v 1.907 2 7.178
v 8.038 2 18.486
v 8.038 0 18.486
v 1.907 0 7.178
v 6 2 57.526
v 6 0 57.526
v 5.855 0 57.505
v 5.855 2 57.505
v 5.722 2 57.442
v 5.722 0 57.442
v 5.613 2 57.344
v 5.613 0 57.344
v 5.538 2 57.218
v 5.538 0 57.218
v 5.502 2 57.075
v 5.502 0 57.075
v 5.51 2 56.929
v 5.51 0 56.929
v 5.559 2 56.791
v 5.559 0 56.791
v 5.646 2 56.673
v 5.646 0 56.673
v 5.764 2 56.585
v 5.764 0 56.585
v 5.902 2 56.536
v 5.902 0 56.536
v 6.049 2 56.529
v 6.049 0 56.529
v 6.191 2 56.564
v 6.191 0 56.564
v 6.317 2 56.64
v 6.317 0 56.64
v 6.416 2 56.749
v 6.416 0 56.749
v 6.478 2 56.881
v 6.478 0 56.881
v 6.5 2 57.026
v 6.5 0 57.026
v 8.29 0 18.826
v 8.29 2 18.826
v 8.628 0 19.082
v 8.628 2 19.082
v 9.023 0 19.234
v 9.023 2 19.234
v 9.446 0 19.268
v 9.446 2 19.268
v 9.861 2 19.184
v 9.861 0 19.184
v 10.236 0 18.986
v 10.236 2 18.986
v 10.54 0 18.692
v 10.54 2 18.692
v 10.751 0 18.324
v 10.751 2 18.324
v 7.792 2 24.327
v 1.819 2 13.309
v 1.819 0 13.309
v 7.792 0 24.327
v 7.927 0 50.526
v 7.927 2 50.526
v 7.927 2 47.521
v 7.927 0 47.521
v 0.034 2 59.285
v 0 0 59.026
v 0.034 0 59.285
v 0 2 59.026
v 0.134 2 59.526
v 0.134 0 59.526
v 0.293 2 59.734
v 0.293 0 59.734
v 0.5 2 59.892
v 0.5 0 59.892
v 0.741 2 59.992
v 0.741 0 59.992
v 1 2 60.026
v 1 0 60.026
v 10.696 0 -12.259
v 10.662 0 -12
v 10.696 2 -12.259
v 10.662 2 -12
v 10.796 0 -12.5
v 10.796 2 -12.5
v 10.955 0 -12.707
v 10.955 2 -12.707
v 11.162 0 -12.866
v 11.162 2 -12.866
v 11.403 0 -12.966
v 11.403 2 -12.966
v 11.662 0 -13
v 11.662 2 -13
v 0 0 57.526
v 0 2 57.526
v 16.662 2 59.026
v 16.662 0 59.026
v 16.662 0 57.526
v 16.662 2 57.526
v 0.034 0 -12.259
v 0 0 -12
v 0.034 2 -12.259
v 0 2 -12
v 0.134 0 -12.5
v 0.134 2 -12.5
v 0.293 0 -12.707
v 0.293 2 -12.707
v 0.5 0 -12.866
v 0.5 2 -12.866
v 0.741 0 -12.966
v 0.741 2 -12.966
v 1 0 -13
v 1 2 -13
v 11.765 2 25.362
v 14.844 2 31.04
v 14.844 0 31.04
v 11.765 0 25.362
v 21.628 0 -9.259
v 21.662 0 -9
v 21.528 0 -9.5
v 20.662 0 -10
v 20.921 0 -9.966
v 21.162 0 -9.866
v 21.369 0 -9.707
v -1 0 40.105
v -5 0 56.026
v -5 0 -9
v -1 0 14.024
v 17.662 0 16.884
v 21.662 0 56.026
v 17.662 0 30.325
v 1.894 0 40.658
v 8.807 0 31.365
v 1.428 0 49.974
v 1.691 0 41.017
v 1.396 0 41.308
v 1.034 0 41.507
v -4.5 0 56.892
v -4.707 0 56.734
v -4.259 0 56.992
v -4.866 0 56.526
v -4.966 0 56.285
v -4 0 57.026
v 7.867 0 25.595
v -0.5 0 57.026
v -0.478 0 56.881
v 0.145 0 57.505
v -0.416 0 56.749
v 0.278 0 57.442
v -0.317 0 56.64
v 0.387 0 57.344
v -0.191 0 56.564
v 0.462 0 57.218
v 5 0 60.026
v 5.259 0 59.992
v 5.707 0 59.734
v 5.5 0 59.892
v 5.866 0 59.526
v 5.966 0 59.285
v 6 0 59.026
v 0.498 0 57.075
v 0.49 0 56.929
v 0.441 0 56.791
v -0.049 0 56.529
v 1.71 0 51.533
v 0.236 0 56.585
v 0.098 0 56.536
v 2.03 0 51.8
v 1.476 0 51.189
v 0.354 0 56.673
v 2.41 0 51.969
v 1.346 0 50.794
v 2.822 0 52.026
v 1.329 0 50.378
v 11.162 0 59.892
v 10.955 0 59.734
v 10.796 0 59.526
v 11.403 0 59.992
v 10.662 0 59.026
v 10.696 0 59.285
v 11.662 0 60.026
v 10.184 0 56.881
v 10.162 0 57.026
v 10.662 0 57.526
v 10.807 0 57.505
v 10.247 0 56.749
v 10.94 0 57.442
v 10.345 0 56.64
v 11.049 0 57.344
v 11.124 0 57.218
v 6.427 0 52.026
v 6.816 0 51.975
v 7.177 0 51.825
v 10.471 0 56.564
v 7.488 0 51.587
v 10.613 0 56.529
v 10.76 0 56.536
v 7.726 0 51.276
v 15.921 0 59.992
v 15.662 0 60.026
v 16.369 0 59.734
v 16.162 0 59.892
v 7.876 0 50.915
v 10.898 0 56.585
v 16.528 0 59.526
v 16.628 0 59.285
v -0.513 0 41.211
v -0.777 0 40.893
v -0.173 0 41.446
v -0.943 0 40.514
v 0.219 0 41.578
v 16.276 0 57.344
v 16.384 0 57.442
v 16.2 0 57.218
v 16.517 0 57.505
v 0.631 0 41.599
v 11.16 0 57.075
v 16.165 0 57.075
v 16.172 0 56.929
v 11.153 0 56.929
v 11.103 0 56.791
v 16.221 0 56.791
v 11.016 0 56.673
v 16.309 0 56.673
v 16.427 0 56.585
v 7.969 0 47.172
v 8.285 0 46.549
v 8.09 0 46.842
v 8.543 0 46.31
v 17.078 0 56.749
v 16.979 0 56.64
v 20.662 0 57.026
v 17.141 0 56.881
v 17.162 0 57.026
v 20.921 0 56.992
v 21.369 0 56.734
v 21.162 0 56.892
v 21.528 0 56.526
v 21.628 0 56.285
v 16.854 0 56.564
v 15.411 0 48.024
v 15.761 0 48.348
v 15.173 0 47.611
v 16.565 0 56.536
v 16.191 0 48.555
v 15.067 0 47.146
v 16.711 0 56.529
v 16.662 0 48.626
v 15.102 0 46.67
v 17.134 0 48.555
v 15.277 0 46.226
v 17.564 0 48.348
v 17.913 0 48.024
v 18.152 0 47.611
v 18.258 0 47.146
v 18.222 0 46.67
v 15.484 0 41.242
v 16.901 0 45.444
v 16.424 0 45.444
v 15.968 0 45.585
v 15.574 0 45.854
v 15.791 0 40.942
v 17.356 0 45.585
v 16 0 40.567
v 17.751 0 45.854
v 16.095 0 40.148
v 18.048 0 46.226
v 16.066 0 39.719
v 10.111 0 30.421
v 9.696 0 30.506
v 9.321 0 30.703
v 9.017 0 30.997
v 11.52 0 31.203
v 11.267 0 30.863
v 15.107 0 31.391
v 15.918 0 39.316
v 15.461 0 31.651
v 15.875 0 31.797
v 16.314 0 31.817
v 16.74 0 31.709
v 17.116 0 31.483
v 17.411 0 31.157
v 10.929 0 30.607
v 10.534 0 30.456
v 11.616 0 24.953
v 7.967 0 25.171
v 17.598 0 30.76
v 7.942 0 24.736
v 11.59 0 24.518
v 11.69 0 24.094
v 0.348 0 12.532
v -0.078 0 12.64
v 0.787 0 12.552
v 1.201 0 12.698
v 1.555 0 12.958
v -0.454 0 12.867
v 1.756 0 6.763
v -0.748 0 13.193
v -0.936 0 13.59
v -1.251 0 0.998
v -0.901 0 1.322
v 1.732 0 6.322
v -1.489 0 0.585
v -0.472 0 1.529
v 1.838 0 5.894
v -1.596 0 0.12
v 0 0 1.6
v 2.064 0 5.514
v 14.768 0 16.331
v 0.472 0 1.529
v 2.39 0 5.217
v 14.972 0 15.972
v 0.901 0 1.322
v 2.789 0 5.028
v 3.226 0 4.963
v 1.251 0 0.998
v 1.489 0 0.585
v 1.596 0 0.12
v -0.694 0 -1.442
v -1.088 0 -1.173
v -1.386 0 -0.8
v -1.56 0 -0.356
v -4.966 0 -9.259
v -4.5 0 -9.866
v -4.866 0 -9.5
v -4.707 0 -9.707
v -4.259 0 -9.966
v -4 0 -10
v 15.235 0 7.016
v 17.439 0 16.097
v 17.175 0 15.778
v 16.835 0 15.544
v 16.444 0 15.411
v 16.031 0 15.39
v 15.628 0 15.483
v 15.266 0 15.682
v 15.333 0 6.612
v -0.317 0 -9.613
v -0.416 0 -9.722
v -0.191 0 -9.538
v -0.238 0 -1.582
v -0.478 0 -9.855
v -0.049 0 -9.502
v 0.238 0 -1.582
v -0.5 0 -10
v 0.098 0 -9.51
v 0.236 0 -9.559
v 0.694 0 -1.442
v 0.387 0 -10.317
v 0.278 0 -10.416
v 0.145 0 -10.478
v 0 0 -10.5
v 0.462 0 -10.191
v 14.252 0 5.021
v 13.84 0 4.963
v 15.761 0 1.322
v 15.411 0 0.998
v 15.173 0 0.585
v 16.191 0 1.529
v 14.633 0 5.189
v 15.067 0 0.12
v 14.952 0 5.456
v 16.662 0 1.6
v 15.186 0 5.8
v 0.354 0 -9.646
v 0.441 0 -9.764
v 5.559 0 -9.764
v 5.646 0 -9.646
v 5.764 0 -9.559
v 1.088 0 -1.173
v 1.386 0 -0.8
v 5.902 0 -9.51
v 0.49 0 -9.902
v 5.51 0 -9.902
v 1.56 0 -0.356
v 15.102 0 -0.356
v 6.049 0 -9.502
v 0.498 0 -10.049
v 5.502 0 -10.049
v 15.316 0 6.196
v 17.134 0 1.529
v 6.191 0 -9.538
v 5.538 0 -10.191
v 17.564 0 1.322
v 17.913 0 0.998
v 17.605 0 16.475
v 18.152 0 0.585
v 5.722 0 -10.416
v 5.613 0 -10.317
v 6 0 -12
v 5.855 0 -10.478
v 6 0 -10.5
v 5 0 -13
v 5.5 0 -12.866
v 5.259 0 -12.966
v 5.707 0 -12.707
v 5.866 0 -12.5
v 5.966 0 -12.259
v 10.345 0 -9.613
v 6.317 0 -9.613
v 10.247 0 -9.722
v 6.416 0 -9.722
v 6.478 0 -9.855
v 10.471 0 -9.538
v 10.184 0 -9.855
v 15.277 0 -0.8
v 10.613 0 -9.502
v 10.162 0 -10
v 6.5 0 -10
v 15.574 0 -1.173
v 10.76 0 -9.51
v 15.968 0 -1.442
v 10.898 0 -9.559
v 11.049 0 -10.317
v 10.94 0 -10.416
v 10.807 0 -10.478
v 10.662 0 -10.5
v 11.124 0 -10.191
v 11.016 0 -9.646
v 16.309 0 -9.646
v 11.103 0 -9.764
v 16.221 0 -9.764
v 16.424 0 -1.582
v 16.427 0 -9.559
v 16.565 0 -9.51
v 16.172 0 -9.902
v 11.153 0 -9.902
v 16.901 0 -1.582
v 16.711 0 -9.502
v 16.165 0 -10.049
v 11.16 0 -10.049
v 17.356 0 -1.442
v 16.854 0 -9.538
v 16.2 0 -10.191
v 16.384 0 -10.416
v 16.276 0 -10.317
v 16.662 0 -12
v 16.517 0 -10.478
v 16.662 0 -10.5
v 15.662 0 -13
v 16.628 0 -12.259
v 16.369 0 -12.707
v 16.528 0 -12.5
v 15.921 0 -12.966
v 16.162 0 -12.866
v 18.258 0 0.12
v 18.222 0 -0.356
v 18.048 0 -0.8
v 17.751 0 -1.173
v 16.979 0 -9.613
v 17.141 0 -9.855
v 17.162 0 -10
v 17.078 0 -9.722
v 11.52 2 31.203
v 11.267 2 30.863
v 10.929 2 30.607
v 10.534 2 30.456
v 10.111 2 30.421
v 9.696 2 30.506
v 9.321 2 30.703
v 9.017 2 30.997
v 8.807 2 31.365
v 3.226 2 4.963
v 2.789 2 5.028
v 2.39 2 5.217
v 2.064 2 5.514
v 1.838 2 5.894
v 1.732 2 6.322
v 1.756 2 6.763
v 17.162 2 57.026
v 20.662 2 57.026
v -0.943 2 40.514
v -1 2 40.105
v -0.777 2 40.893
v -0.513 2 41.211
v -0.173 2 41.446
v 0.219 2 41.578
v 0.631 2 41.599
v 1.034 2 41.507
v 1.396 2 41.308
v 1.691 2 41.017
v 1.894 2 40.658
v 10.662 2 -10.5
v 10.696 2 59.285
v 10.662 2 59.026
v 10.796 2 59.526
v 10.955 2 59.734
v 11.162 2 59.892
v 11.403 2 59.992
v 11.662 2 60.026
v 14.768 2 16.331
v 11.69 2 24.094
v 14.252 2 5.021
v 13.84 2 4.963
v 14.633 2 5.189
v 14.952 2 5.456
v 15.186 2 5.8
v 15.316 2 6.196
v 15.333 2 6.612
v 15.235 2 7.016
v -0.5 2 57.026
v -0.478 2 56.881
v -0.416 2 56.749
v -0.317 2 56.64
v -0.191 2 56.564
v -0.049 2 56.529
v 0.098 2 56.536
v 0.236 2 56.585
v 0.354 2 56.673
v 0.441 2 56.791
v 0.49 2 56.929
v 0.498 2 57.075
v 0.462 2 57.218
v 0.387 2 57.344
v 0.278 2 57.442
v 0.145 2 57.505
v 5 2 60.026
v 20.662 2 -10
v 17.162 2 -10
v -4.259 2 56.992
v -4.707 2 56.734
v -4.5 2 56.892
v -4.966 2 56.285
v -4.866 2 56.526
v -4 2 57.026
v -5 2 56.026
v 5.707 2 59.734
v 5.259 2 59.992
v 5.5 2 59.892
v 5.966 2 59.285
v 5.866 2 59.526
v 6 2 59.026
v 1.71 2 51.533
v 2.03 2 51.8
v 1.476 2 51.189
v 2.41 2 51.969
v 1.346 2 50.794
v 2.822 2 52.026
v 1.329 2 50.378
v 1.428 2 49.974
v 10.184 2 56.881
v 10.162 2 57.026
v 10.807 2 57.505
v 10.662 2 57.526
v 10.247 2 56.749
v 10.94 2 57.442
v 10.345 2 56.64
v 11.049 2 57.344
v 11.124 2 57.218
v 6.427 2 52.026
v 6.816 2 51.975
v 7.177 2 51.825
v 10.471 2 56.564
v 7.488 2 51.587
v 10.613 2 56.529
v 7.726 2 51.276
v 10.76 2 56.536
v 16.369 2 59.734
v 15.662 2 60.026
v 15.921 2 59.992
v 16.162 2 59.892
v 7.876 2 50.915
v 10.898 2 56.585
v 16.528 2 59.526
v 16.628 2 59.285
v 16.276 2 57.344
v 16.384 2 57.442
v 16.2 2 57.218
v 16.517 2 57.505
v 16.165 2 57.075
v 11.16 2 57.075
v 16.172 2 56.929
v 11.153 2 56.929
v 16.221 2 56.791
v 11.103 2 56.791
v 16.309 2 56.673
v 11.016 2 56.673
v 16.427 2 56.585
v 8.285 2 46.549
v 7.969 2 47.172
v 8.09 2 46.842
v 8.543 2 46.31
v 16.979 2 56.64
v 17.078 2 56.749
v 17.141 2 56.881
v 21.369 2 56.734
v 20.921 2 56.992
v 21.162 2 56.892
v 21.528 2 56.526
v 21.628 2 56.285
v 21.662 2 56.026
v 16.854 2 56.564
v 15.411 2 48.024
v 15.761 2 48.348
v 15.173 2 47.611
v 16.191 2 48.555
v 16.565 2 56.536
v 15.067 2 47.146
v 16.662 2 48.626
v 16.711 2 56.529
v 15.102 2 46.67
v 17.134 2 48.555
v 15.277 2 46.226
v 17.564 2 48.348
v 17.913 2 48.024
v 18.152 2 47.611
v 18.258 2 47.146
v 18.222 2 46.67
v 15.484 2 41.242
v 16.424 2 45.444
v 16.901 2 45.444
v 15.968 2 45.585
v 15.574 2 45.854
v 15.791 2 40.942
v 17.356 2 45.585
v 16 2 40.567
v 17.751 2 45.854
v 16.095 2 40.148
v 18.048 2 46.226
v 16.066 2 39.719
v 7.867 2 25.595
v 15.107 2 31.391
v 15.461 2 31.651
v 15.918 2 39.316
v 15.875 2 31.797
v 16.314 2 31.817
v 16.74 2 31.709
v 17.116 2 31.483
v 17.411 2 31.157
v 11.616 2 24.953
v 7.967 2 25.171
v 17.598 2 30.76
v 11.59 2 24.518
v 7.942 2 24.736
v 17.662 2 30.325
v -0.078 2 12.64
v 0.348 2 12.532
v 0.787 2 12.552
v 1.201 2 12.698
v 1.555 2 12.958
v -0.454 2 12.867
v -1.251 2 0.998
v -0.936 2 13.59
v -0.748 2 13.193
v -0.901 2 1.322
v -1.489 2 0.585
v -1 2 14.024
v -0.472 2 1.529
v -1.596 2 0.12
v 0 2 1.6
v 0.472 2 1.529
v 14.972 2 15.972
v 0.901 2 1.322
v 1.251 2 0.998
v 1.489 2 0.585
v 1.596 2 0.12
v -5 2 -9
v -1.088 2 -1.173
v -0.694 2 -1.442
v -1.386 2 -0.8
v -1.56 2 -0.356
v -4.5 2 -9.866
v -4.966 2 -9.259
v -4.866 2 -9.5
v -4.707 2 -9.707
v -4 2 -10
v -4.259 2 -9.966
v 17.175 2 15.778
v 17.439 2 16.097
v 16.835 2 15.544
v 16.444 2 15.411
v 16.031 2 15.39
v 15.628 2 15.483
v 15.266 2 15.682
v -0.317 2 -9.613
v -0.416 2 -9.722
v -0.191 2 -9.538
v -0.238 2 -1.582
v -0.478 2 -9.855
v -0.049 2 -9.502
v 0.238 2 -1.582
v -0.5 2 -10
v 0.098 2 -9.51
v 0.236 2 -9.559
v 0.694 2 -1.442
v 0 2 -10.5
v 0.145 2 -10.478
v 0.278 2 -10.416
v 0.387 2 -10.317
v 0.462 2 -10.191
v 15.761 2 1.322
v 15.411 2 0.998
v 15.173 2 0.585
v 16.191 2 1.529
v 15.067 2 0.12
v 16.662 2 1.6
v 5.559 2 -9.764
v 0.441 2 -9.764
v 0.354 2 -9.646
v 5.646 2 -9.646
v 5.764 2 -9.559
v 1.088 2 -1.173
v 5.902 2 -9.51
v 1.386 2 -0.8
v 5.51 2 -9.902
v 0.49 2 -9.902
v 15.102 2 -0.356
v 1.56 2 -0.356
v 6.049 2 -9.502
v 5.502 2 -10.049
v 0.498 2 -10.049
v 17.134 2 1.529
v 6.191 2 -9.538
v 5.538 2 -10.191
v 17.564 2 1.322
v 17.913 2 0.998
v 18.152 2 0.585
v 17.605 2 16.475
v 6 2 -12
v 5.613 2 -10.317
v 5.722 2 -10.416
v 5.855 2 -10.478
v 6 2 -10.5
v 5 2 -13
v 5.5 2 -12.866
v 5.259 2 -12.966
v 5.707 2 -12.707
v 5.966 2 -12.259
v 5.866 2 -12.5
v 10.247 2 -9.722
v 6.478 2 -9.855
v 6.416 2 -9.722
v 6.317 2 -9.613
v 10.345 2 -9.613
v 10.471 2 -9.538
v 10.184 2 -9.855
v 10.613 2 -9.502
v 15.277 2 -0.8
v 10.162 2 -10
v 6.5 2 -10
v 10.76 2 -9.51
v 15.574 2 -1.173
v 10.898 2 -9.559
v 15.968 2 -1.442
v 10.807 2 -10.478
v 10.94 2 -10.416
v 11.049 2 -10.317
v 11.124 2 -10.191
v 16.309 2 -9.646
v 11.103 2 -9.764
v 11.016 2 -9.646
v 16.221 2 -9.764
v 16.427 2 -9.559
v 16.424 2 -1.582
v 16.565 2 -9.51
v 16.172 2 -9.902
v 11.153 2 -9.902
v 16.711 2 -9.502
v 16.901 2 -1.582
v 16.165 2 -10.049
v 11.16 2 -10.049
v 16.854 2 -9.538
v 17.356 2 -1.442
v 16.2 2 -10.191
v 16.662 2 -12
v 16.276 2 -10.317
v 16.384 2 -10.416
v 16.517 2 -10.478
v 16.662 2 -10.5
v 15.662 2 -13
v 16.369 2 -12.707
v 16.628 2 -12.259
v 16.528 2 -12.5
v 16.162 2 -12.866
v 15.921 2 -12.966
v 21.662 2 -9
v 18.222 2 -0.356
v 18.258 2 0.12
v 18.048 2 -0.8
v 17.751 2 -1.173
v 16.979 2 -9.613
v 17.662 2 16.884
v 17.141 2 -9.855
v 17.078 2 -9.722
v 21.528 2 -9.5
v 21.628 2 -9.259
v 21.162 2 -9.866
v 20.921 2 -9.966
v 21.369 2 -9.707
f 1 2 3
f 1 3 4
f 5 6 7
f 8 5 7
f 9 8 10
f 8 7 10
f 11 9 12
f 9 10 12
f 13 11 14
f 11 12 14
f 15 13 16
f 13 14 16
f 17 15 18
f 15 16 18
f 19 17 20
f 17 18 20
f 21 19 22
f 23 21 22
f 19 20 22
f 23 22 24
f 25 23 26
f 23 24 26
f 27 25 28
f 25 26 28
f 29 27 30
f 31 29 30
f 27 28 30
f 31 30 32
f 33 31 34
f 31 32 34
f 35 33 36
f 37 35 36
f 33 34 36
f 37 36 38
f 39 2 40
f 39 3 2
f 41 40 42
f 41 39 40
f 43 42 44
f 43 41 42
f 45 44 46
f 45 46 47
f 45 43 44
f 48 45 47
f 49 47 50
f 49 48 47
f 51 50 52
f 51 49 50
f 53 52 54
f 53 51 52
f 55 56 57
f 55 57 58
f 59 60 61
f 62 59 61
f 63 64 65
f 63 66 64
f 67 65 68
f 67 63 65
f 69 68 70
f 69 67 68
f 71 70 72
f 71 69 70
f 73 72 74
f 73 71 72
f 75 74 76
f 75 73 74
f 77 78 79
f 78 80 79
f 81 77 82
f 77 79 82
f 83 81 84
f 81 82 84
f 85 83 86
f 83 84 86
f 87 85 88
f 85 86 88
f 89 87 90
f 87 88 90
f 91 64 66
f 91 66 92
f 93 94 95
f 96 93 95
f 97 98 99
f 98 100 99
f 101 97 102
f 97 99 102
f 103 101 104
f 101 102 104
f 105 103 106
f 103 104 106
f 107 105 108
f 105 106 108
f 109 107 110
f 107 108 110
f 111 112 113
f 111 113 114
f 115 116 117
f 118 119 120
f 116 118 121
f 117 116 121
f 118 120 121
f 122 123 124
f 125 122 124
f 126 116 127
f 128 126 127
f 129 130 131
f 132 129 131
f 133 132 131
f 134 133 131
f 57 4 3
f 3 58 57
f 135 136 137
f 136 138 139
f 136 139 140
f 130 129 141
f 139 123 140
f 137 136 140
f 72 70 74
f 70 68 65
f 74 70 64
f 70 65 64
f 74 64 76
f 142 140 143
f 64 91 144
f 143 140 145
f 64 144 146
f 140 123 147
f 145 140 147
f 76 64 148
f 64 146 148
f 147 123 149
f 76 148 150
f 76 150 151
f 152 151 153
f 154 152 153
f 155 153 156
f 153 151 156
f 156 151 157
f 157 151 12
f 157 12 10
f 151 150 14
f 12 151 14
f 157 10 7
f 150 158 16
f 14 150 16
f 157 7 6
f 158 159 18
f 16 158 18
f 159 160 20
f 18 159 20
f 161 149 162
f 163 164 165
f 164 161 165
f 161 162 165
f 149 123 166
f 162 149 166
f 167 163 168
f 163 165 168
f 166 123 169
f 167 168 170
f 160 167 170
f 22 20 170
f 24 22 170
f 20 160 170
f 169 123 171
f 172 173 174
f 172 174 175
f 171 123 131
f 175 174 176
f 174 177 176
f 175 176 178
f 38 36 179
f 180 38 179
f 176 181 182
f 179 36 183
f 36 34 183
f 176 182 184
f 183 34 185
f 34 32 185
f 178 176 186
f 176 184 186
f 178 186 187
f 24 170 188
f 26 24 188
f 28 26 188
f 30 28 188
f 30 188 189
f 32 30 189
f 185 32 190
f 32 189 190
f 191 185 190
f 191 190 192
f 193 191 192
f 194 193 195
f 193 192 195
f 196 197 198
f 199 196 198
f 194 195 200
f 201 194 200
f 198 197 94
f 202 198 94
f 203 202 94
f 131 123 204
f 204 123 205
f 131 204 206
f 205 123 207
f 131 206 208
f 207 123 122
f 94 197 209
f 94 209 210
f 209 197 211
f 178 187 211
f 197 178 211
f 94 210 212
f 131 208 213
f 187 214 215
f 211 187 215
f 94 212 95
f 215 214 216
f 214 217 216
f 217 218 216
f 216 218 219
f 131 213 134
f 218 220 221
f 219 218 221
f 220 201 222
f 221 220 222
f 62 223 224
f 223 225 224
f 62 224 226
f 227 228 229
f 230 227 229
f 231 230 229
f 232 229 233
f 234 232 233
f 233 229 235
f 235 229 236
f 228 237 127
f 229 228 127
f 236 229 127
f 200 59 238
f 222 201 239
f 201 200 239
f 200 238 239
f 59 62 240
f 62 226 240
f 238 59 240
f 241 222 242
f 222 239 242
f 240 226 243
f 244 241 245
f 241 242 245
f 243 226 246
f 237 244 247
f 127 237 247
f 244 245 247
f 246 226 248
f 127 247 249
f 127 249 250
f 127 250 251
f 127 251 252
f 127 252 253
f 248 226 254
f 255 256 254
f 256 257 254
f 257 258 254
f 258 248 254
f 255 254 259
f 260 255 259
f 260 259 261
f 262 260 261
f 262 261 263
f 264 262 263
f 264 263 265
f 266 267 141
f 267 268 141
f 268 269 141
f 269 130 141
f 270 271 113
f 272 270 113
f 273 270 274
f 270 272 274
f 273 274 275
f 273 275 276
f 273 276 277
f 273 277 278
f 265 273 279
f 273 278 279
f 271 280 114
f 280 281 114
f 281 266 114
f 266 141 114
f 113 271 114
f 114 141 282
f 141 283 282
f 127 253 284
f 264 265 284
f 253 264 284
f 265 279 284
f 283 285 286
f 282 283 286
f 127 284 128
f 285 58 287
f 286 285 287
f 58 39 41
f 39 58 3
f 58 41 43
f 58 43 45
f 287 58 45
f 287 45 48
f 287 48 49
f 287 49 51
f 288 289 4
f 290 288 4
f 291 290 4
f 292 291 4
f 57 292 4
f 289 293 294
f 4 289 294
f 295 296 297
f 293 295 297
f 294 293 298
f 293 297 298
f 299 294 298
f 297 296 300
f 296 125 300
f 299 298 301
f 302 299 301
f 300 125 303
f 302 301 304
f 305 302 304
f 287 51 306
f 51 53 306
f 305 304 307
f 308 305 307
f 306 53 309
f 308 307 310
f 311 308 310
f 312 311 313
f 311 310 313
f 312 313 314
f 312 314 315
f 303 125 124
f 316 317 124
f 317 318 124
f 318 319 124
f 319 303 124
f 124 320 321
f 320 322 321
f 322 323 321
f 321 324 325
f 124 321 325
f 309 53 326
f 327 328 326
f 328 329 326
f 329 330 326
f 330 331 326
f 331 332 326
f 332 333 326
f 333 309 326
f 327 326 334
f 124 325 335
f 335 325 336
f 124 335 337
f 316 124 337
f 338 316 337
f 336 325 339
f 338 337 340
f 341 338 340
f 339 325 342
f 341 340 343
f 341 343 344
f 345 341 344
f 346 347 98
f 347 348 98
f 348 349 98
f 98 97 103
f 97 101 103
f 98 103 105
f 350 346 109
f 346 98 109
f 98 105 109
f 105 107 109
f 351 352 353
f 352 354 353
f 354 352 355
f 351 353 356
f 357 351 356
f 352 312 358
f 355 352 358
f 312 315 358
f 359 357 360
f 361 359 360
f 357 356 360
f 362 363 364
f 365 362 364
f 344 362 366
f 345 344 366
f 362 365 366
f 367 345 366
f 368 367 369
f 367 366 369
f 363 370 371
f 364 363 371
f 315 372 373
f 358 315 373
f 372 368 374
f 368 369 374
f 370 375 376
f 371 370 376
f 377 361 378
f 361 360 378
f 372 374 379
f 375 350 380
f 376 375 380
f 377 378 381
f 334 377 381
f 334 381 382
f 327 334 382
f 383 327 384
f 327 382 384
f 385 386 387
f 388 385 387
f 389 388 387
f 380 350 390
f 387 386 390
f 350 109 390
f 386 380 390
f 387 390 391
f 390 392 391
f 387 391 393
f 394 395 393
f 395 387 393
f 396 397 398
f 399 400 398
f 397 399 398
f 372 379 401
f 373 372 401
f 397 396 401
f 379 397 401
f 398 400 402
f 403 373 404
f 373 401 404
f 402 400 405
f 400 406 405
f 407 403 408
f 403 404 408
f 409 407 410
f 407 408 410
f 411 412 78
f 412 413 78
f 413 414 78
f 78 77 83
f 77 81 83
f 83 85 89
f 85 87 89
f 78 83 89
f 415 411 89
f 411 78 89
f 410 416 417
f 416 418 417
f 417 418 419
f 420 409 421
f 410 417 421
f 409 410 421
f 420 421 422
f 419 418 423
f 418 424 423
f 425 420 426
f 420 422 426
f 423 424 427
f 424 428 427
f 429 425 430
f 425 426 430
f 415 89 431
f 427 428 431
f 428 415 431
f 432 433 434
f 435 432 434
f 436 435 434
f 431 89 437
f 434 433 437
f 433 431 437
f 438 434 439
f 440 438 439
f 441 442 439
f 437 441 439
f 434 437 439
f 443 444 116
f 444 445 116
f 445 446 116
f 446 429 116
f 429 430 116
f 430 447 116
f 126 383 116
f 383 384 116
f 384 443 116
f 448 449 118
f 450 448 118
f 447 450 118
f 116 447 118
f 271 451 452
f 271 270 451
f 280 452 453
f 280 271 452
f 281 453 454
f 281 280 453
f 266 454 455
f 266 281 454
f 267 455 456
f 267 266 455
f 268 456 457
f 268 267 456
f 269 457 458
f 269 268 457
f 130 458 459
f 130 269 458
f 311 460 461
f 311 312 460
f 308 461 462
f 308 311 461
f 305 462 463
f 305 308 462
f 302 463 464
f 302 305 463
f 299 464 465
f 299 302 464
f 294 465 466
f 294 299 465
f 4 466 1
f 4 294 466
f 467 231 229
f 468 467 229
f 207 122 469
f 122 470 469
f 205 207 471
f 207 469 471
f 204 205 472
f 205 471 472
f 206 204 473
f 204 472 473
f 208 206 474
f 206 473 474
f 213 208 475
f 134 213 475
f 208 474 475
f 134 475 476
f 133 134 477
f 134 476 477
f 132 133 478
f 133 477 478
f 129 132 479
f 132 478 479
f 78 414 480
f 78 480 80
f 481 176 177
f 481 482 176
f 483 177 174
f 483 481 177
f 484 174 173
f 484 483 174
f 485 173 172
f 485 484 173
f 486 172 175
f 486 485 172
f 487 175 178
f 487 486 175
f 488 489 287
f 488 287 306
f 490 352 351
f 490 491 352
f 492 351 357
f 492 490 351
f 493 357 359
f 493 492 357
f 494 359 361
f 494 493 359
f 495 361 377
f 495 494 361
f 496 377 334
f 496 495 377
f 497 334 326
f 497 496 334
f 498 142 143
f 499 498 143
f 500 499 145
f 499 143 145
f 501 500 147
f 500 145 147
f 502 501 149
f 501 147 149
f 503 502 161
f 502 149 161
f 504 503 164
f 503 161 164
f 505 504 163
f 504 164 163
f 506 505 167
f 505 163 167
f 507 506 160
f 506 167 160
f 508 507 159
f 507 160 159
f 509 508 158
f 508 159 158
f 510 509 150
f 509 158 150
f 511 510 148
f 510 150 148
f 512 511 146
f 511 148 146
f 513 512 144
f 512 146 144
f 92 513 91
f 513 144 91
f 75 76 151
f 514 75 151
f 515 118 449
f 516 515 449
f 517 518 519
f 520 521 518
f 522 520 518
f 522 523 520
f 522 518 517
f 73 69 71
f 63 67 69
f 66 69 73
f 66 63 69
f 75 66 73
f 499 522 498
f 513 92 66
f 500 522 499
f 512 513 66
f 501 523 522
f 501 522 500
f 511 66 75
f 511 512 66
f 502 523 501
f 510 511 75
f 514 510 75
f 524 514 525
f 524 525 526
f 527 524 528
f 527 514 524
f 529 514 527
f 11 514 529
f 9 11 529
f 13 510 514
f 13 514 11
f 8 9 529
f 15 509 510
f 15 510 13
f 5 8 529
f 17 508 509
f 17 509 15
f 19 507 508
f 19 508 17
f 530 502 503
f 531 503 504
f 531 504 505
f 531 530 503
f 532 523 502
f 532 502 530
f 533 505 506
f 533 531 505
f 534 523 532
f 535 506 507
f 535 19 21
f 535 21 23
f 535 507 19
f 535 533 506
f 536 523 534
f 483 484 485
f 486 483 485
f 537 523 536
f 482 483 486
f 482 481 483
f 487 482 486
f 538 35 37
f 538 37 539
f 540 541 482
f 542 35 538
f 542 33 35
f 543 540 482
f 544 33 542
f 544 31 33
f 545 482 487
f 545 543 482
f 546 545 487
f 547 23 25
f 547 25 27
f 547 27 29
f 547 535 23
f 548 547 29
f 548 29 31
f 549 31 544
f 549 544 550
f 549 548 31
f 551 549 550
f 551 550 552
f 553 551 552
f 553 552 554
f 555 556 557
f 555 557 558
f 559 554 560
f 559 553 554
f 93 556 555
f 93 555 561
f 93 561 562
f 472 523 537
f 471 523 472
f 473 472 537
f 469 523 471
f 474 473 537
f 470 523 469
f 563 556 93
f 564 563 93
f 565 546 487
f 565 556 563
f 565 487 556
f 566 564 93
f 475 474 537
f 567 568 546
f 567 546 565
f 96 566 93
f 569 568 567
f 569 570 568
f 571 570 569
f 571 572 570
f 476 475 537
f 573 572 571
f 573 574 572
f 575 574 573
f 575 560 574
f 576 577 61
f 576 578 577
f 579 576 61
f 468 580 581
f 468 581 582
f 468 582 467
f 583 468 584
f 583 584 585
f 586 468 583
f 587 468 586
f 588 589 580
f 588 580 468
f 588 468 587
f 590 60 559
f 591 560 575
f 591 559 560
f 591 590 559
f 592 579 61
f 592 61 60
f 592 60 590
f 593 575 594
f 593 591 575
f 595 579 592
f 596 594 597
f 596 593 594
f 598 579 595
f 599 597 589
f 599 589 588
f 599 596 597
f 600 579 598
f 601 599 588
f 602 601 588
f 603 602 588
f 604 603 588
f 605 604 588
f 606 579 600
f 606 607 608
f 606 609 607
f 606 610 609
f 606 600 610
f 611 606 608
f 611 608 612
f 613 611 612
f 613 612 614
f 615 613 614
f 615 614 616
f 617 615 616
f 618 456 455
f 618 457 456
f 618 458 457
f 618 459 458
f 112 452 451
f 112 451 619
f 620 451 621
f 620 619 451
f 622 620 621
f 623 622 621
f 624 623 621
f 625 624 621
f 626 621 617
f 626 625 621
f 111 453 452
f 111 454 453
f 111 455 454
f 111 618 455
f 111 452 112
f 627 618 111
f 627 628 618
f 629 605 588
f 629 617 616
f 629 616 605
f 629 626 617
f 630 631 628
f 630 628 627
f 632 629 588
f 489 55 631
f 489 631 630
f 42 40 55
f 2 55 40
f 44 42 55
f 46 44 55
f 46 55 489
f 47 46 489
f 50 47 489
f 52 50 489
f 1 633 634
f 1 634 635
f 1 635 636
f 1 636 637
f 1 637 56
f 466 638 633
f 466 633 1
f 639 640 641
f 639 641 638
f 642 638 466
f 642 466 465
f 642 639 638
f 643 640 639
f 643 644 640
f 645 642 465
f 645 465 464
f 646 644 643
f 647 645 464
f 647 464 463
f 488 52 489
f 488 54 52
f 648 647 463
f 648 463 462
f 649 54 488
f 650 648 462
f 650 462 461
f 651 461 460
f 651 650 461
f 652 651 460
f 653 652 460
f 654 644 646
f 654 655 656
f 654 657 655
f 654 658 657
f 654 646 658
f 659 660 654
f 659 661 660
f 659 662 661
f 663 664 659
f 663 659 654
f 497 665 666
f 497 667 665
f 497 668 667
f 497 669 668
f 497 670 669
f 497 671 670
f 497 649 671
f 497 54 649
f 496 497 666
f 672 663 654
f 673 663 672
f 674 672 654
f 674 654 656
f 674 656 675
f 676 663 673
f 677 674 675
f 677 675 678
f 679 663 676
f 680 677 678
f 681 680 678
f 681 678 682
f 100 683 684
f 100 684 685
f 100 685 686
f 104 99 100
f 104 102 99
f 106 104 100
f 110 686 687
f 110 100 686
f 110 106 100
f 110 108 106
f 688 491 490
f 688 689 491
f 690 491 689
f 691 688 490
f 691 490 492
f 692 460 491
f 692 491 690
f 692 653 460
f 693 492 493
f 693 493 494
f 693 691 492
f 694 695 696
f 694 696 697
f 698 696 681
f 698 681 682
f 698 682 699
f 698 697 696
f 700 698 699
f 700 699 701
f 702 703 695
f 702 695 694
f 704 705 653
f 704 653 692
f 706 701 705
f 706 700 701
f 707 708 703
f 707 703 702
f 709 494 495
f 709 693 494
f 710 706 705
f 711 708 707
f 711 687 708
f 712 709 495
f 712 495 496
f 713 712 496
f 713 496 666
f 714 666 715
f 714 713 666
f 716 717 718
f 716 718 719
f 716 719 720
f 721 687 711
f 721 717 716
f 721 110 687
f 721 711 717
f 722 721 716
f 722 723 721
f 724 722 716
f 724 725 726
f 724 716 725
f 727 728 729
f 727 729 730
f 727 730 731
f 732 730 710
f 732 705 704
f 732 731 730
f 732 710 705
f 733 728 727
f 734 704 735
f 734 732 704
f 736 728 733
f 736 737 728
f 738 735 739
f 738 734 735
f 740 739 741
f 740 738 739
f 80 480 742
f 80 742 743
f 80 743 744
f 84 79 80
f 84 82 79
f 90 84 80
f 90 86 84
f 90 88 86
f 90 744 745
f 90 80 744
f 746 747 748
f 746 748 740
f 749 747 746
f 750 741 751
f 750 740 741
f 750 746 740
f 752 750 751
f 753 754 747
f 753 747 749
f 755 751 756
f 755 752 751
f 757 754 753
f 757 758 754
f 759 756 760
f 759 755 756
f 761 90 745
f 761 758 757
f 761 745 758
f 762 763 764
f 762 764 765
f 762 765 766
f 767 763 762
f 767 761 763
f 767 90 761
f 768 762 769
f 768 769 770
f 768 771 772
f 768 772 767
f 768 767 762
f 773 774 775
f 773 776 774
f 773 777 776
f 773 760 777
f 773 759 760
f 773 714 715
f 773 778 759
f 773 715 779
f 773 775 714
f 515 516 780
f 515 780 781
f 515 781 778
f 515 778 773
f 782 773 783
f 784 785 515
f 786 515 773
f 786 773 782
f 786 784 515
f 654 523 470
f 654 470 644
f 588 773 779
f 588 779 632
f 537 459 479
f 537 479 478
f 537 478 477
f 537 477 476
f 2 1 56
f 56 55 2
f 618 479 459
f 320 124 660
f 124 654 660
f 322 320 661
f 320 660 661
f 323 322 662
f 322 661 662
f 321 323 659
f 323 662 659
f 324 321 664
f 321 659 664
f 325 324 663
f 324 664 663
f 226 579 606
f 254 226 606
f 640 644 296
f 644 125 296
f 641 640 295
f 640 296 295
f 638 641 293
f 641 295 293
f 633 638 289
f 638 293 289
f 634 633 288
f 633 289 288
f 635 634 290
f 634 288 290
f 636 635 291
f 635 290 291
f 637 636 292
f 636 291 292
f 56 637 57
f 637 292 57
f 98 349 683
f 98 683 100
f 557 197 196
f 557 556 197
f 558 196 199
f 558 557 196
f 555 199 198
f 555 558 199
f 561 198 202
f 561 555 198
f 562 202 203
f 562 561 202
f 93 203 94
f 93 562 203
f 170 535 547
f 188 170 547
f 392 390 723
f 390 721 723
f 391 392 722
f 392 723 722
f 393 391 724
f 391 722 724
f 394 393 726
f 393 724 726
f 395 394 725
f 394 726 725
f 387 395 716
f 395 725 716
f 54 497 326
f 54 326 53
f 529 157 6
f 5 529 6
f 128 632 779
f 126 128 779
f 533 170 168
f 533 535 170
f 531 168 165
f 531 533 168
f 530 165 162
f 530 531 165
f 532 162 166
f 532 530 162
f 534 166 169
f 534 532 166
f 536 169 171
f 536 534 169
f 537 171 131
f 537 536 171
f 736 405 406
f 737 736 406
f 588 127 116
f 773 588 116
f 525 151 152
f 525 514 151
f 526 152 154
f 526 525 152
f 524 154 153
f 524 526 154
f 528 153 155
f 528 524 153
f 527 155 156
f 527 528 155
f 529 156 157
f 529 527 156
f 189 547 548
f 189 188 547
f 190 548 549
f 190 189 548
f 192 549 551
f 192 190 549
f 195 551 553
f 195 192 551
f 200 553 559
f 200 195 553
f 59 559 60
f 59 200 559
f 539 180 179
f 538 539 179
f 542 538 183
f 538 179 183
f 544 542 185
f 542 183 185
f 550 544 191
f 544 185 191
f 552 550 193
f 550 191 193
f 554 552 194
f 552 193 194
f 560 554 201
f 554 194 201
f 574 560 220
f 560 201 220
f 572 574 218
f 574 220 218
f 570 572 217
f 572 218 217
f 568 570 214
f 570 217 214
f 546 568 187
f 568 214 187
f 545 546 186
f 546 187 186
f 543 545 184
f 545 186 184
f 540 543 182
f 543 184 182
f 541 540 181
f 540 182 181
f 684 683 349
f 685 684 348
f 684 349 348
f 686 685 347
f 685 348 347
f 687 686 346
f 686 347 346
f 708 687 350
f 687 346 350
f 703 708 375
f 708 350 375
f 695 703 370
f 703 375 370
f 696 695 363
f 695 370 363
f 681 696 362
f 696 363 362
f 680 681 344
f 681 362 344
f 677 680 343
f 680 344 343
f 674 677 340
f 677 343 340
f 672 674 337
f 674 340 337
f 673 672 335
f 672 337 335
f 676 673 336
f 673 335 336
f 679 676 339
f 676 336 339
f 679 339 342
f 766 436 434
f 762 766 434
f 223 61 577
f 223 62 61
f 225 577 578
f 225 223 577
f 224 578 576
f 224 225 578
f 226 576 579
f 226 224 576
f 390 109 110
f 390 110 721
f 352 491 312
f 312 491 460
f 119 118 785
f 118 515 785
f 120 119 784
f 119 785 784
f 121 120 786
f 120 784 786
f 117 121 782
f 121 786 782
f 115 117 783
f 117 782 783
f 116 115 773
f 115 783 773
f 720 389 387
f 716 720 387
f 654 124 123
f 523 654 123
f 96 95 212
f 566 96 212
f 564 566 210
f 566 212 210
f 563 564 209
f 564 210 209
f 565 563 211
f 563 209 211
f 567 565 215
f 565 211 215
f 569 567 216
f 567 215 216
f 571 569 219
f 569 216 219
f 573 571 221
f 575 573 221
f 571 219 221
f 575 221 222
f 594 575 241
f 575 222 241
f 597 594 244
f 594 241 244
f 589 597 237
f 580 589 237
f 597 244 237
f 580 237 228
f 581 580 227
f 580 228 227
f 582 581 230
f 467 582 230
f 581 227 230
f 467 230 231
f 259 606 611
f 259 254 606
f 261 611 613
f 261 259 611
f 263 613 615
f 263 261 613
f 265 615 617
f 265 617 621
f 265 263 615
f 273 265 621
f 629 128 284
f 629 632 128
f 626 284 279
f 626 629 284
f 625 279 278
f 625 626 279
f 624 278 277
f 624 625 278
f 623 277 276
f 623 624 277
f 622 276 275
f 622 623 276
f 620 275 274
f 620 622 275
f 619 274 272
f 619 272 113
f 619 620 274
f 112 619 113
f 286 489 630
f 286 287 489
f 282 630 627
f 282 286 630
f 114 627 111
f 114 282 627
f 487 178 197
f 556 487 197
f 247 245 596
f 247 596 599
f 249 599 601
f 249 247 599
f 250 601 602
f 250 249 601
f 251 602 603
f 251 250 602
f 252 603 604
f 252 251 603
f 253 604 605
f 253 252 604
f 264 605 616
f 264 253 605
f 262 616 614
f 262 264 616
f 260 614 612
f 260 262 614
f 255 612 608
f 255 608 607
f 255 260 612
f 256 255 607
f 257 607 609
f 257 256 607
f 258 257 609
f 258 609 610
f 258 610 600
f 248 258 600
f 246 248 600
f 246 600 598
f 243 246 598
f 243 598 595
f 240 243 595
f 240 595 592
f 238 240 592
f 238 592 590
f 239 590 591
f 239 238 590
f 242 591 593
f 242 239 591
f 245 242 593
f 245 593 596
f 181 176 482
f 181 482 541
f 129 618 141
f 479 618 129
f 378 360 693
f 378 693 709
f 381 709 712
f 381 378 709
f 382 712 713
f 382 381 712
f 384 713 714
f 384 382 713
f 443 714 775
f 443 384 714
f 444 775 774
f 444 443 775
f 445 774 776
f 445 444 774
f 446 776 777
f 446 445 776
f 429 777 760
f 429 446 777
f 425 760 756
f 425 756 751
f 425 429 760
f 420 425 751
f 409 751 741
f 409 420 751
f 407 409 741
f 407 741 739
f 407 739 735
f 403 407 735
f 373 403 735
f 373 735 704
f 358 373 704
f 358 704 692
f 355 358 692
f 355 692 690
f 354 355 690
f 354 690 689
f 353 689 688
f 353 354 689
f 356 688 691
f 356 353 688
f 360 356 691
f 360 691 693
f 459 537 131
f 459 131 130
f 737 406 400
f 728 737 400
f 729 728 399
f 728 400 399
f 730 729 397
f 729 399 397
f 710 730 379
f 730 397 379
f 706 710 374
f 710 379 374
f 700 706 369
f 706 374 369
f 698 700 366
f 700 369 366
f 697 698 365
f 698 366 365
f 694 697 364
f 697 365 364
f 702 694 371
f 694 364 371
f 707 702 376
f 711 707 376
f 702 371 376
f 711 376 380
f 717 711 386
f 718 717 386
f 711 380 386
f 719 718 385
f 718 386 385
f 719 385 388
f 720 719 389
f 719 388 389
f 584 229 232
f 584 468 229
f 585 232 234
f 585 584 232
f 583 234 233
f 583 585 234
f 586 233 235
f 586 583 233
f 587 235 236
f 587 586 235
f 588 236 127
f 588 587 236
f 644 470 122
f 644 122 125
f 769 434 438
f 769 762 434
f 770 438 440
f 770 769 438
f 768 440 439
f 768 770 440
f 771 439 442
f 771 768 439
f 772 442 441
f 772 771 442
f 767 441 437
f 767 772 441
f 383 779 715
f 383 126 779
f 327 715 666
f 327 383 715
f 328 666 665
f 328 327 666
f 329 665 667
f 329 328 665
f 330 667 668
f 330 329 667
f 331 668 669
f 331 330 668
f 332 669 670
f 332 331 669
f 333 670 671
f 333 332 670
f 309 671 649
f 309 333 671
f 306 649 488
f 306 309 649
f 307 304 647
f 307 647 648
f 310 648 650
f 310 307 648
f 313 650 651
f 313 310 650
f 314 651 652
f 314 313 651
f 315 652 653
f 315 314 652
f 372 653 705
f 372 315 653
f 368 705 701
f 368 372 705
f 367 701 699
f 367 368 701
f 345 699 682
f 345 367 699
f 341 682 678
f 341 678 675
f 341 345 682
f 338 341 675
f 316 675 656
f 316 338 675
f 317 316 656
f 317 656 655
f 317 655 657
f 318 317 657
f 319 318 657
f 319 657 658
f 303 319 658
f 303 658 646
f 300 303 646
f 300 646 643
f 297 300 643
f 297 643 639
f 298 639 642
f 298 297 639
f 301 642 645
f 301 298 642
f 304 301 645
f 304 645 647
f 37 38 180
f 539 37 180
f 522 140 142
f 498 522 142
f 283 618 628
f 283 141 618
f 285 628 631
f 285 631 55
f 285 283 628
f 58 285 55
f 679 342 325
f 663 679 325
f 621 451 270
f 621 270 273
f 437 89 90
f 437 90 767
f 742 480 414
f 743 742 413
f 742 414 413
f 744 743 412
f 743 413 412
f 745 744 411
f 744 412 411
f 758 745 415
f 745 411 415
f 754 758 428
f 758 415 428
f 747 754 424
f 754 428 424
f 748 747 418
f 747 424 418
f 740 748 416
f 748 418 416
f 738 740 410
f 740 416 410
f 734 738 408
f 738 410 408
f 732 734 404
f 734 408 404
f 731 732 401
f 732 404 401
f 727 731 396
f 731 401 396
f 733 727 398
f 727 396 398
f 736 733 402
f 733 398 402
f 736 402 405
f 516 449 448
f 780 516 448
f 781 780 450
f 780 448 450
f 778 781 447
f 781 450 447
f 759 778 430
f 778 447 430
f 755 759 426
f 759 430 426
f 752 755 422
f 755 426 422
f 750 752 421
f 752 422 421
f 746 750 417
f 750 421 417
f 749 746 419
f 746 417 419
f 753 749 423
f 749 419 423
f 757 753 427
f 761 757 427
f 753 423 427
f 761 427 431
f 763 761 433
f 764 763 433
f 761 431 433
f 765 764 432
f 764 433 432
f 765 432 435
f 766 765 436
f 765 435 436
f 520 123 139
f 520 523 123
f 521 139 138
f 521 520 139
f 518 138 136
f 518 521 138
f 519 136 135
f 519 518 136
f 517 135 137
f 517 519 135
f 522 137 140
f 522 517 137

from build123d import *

# Parameters (mm, degrees)
SKETCH1_R           = 1.6
SKETCH1_W           = 6
SKETCH1_H           = 3
BOSS_EXTRUDE1_DEPTH = 2
FILLET1_R           = 1
SKETCH3_R           = 0.5
CUT_EXTRUDE1_DEPTH  = 2
SKETCH4_W           = 8.927318102
SKETCH4_H           = 47.063450143
SKETCH4_W_2         = 9.73496377
SKETCH4_H_2         = 34.688645835
CUT_EXTRUDE2_DEPTH  = 2
EXTRUDE_THIN1_DEPTH = 2
FILLET2_R           = 1.5


with BuildPart() as part:
    # Sketch1 → Boss-Extrude1 (new body)
    # profile 1 of 5: a face of its own
    with BuildSketch(Plane(origin=(0, 0, 0), x_dir=(1, 0, 0), z_dir=(0, 1, 0))):
        Polygon((6, 10), (0, 10), (-5, 10), (-5, -57.026436391), (0, -57.026436391), (6, -57.026436391), (10.662281872, -57.026436391), (16.662281872, -57.026436391), (21.662281872, -57.026436391), (21.662281872, 10), (16.662281872, 10), (10.662281872, 10), align=None)
        with Locations(Location((16.662281872, -47.026436391, 0), (0, 0, 270))):
            Circle(SKETCH1_R, mode=Mode.SUBTRACT)
        with Locations(Location((0, 0, 0), (0, 0, 270))):
            Circle(SKETCH1_R, mode=Mode.SUBTRACT)
        with Locations(Location((16.662281872, 0, 0), (0, 0, 270))):
            Circle(SKETCH1_R, mode=Mode.SUBTRACT)
    # profile 2 of 5: a face of its own
    with BuildSketch(Plane(origin=(0, 0, 0), x_dir=(1, 0, 0), z_dir=(0, 1, 0))):
        with Locations((13.662281872, 11.5)):
            Rectangle(SKETCH1_W, SKETCH1_H)
    # profile 3 of 5: a face of its own
    with BuildSketch(Plane(origin=(0, 0, 0), x_dir=(1, 0, 0), z_dir=(0, 1, 0))):
        with Locations((3, 11.5)):
            Rectangle(SKETCH1_W, SKETCH1_H)
    # profile 4 of 5: a face of its own
    with BuildSketch(Plane(origin=(0, 0, 0), x_dir=(1, 0, 0), z_dir=(0, 1, 0))):
        with Locations((3, -58.526436391)):
            Rectangle(SKETCH1_W, SKETCH1_H)
    # profile 5 of 5: a face of its own
    with BuildSketch(Plane(origin=(0, 0, 0), x_dir=(1, 0, 0), z_dir=(0, 1, 0))):
        with Locations((13.662281872, -58.526436391)):
            Rectangle(SKETCH1_W, SKETCH1_H)
    extrude(amount=BOSS_EXTRUDE1_DEPTH)

    # Fillet1
    fillet1_edges = [part.edges().sort_by_distance(p)[0] for p in [
        (21.662281872, 1, 57.026436391),
        (16.662281872, 1, 60.026436391),
        (10.662281872, 1, 60.026436391),
        (6, 1, 60.026436391),
        (0, 1, 60.026436391),
        (-5, 1, 57.026436391),
        (-5, 1, -10),
        (0, 1, -13),
        (6, 1, -13),
        (10.662281872, 1, -13),
        (16.662281872, 1, -13),
        (21.662281872, 1, -10),
    ]]
    fillet(fillet1_edges, radius=FILLET1_R)

    # Sketch3 → Cut-Extrude1 (cut)
    with BuildSketch(Plane.XZ):
        with Locations((0, 57.026436391)):
            Circle(SKETCH3_R)
        with Locations((6, 57.026436391)):
            Circle(SKETCH3_R)
        with Locations((10.662281872, 57.026436391)):
            Circle(SKETCH3_R)
        with Locations((16.662281872, 57.026436391)):
            Circle(SKETCH3_R)
        with Locations((0, -10)):
            Circle(SKETCH3_R)
        with Locations((6, -10)):
            Circle(SKETCH3_R)
        with Locations((10.662281872, -10)):
            Circle(SKETCH3_R)
        with Locations((16.662281872, -10)):
            Circle(SKETCH3_R)
    extrude(amount=-CUT_EXTRUDE1_DEPTH, mode=Mode.SUBTRACT)

    # Sketch4 → Cut-Extrude2 (cut)
    with BuildSketch(Plane(origin=(0, 2, 0), x_dir=(1, 0, 0), z_dir=(0, 1, 0))):
        with Locations((3.463659051, -28.49471132)):
            Rectangle(SKETCH4_W, SKETCH4_H)
        with Locations((12.794799987, -22.307309166)):
            Rectangle(SKETCH4_W_2, SKETCH4_H_2)
        Polygon((7.927318102, -39.651632083), (7.927318102, -46.759423391), (17.662281872, -39.651632083), align=None)
    extrude(amount=-CUT_EXTRUDE2_DEPTH, mode=Mode.SUBTRACT)

    # Sketch6 → Extrude-Thin1 (add)
    with BuildSketch(Plane(origin=(0, 2, 0), x_dir=(1, 0, 0), z_dir=(0, 1, 0))):
        Polygon((-2.318677564, -5.677891475), (17.181124518, -41.646227603), (19.818479645, -40.216417149), (0.318677564, -4.248081021), align=None)
        Polygon((16.267906789, -4.410068416), (-2.394375083, -51.473518559), (0.394375083, -52.579354223), (19.056656955, -5.51590408), align=None)
    extrude(amount=-EXTRUDE_THIN1_DEPTH)

    # Fillet2
    fillet2_edges = [part.edges().sort_by_distance(p)[0] for p in [
        (7.927318102, 1, 46.759423391),
        (7.927318102, 1, 52.026436391),
        (17.662281872, 1, 9.032306985),
        (17.662281872, 1, 36.239205179),
        (16.048655791, 1, 4.962986248),
        (0.706254859, 1, 4.962986248),
        (-1, 1, 47.957115655),
        (-1, 1, 8.110256565),
        (0.613626081, 1, 52.026436391),
        (16.542874861, 1, 40.468944978),
        (9.989723555, 1, 28.381337735),
        (9.567384345, 1, 21.307771825),
        (11.431310298, 1, 24.745874168),
        (8.125797601, 1, 24.943235392),
    ]]
    fillet(fillet2_edges, radius=FILLET2_R)


solid = part.part
